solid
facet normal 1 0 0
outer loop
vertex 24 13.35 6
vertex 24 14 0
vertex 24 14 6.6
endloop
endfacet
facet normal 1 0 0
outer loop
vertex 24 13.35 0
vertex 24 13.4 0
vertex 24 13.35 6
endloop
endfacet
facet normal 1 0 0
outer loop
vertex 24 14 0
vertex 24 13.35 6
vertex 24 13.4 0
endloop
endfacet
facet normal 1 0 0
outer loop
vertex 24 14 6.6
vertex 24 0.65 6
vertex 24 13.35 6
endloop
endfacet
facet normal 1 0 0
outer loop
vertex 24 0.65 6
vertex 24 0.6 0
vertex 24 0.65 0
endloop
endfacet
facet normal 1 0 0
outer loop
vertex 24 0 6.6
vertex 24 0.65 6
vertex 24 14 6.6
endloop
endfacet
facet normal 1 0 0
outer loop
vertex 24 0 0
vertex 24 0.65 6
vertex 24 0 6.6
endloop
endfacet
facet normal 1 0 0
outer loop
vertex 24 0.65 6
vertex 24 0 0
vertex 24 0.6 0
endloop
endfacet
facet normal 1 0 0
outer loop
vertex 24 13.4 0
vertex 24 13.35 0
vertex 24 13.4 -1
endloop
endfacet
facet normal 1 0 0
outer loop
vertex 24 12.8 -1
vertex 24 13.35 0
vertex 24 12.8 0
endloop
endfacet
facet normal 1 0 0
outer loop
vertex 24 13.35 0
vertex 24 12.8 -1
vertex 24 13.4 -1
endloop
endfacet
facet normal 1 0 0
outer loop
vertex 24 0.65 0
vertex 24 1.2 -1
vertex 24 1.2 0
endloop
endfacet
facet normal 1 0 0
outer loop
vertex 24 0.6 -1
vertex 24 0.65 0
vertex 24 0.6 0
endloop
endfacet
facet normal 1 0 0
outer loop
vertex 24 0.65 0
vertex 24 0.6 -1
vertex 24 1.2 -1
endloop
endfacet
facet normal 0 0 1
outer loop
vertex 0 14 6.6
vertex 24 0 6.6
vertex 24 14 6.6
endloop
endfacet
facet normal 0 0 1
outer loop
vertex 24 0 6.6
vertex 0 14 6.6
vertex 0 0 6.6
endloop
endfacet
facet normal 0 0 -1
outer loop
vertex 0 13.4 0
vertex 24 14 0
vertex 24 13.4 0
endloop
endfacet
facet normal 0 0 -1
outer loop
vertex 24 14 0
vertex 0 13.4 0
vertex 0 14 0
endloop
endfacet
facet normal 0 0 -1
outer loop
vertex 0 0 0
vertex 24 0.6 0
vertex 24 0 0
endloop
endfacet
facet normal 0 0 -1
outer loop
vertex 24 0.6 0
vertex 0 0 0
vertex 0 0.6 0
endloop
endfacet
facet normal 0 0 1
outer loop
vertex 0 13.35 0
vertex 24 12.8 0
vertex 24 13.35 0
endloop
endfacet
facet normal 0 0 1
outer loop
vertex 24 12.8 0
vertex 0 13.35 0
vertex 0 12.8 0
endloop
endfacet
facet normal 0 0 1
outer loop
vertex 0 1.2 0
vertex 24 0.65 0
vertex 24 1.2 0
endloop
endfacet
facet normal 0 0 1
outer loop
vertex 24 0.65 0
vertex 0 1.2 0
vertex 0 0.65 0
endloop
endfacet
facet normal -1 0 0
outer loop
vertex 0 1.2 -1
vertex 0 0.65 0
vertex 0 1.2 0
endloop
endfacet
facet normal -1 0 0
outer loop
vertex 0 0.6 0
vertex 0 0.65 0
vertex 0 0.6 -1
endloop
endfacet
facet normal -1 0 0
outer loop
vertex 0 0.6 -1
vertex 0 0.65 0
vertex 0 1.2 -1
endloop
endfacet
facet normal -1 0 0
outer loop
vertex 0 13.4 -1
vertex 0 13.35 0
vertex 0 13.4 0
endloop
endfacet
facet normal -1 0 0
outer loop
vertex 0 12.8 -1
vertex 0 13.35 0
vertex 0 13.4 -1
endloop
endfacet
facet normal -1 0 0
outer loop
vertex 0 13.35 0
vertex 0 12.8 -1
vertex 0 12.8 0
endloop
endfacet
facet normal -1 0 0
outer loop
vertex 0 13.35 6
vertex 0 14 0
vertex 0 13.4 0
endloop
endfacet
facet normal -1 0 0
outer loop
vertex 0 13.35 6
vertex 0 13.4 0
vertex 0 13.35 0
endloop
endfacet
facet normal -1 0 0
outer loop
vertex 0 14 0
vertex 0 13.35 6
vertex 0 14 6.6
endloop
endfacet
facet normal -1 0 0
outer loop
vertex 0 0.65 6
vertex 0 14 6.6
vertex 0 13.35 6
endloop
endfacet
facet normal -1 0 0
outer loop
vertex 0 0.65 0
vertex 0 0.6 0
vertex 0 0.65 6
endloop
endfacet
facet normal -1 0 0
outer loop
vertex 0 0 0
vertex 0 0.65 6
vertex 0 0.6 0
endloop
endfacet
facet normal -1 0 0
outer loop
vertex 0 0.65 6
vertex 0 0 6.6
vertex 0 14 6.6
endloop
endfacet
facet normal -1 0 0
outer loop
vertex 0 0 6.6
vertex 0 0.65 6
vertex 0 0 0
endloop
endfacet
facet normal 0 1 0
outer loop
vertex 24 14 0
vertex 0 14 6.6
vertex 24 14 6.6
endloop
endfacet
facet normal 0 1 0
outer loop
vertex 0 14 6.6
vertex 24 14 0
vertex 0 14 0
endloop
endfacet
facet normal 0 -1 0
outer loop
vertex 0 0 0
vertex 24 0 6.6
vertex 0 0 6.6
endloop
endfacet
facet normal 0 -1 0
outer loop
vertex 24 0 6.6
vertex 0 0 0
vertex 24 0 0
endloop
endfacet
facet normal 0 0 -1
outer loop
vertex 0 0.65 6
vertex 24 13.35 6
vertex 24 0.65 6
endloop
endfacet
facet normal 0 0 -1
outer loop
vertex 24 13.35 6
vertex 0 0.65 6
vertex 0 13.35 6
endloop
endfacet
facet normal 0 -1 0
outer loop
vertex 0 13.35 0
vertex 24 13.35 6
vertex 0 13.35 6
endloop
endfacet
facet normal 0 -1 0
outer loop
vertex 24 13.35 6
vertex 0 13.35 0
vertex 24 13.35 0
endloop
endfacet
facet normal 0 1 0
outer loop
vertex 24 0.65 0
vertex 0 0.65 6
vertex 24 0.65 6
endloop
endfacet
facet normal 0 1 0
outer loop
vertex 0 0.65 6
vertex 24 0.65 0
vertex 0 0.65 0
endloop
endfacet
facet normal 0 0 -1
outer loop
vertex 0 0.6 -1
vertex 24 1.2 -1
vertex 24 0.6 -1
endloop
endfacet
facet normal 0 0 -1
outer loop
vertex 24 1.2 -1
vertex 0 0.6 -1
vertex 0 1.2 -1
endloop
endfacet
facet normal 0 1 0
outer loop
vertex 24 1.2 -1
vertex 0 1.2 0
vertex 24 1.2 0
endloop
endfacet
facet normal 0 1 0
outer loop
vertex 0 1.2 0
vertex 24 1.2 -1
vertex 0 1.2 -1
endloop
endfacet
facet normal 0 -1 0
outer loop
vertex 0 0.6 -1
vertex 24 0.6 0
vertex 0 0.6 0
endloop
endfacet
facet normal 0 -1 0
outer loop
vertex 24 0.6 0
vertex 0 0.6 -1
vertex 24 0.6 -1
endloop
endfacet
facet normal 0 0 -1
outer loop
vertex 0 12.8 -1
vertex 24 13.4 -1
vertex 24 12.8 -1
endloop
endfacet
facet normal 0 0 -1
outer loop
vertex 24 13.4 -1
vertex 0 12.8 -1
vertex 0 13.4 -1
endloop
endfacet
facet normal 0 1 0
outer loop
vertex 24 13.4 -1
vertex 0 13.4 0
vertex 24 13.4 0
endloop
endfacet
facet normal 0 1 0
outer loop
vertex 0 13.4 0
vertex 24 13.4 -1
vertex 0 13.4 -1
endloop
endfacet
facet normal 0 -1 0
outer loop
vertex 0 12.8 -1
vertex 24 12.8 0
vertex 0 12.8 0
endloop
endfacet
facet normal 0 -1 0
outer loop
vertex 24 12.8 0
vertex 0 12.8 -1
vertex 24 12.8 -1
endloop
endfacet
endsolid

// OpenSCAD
// Pad shield: a 0.6 mm PETG U-clip for one YAM finger pad, used in the real trial (not a scored object).
// It covers the pad's outer and two side faces near the tip and leaves the inner grip face open, so the fin 8 mm
// squeeze and the caplet 1 mm squeeze do not change. Print in Prusament PETG, 0.2 mm layers, 3 perimeters, 40% infill.
// Units: mm. The pad's inner face is at z = 0 (open side); the outer face is at z = depth; the clip wraps the sides.

wall       = 0.6;   // PETG wall
length     = 24.0;  // along the pad, near the tip
width      = 14.0;  // across the pad
depth      = 6.0;   // pad thickness covered (outer face at z = depth)
lip        = 1.0;   // small returns on the grip side, so it clips on
$fn        = 32;

module u_clip() {
    difference() {
        // outer block: two side walls and the outer face
        cube([length, width, depth + wall]);
        // the pad seat: open on the grip side (z < 0), wall at each side and the outer face left
        translate([-0.05, wall + 0.05, -0.05])
            cube([length + 0.1, width - 2 * wall - 0.1, depth + 0.05]);
    }
    // two return lips at the open side, 1 mm deep, on the side walls only (the inner face stays exposed)
    translate([0, wall, -lip]) cube([length, wall, lip]);
    translate([0, width - 2 * wall, -lip]) cube([length, wall, lip]);
}

u_clip();
